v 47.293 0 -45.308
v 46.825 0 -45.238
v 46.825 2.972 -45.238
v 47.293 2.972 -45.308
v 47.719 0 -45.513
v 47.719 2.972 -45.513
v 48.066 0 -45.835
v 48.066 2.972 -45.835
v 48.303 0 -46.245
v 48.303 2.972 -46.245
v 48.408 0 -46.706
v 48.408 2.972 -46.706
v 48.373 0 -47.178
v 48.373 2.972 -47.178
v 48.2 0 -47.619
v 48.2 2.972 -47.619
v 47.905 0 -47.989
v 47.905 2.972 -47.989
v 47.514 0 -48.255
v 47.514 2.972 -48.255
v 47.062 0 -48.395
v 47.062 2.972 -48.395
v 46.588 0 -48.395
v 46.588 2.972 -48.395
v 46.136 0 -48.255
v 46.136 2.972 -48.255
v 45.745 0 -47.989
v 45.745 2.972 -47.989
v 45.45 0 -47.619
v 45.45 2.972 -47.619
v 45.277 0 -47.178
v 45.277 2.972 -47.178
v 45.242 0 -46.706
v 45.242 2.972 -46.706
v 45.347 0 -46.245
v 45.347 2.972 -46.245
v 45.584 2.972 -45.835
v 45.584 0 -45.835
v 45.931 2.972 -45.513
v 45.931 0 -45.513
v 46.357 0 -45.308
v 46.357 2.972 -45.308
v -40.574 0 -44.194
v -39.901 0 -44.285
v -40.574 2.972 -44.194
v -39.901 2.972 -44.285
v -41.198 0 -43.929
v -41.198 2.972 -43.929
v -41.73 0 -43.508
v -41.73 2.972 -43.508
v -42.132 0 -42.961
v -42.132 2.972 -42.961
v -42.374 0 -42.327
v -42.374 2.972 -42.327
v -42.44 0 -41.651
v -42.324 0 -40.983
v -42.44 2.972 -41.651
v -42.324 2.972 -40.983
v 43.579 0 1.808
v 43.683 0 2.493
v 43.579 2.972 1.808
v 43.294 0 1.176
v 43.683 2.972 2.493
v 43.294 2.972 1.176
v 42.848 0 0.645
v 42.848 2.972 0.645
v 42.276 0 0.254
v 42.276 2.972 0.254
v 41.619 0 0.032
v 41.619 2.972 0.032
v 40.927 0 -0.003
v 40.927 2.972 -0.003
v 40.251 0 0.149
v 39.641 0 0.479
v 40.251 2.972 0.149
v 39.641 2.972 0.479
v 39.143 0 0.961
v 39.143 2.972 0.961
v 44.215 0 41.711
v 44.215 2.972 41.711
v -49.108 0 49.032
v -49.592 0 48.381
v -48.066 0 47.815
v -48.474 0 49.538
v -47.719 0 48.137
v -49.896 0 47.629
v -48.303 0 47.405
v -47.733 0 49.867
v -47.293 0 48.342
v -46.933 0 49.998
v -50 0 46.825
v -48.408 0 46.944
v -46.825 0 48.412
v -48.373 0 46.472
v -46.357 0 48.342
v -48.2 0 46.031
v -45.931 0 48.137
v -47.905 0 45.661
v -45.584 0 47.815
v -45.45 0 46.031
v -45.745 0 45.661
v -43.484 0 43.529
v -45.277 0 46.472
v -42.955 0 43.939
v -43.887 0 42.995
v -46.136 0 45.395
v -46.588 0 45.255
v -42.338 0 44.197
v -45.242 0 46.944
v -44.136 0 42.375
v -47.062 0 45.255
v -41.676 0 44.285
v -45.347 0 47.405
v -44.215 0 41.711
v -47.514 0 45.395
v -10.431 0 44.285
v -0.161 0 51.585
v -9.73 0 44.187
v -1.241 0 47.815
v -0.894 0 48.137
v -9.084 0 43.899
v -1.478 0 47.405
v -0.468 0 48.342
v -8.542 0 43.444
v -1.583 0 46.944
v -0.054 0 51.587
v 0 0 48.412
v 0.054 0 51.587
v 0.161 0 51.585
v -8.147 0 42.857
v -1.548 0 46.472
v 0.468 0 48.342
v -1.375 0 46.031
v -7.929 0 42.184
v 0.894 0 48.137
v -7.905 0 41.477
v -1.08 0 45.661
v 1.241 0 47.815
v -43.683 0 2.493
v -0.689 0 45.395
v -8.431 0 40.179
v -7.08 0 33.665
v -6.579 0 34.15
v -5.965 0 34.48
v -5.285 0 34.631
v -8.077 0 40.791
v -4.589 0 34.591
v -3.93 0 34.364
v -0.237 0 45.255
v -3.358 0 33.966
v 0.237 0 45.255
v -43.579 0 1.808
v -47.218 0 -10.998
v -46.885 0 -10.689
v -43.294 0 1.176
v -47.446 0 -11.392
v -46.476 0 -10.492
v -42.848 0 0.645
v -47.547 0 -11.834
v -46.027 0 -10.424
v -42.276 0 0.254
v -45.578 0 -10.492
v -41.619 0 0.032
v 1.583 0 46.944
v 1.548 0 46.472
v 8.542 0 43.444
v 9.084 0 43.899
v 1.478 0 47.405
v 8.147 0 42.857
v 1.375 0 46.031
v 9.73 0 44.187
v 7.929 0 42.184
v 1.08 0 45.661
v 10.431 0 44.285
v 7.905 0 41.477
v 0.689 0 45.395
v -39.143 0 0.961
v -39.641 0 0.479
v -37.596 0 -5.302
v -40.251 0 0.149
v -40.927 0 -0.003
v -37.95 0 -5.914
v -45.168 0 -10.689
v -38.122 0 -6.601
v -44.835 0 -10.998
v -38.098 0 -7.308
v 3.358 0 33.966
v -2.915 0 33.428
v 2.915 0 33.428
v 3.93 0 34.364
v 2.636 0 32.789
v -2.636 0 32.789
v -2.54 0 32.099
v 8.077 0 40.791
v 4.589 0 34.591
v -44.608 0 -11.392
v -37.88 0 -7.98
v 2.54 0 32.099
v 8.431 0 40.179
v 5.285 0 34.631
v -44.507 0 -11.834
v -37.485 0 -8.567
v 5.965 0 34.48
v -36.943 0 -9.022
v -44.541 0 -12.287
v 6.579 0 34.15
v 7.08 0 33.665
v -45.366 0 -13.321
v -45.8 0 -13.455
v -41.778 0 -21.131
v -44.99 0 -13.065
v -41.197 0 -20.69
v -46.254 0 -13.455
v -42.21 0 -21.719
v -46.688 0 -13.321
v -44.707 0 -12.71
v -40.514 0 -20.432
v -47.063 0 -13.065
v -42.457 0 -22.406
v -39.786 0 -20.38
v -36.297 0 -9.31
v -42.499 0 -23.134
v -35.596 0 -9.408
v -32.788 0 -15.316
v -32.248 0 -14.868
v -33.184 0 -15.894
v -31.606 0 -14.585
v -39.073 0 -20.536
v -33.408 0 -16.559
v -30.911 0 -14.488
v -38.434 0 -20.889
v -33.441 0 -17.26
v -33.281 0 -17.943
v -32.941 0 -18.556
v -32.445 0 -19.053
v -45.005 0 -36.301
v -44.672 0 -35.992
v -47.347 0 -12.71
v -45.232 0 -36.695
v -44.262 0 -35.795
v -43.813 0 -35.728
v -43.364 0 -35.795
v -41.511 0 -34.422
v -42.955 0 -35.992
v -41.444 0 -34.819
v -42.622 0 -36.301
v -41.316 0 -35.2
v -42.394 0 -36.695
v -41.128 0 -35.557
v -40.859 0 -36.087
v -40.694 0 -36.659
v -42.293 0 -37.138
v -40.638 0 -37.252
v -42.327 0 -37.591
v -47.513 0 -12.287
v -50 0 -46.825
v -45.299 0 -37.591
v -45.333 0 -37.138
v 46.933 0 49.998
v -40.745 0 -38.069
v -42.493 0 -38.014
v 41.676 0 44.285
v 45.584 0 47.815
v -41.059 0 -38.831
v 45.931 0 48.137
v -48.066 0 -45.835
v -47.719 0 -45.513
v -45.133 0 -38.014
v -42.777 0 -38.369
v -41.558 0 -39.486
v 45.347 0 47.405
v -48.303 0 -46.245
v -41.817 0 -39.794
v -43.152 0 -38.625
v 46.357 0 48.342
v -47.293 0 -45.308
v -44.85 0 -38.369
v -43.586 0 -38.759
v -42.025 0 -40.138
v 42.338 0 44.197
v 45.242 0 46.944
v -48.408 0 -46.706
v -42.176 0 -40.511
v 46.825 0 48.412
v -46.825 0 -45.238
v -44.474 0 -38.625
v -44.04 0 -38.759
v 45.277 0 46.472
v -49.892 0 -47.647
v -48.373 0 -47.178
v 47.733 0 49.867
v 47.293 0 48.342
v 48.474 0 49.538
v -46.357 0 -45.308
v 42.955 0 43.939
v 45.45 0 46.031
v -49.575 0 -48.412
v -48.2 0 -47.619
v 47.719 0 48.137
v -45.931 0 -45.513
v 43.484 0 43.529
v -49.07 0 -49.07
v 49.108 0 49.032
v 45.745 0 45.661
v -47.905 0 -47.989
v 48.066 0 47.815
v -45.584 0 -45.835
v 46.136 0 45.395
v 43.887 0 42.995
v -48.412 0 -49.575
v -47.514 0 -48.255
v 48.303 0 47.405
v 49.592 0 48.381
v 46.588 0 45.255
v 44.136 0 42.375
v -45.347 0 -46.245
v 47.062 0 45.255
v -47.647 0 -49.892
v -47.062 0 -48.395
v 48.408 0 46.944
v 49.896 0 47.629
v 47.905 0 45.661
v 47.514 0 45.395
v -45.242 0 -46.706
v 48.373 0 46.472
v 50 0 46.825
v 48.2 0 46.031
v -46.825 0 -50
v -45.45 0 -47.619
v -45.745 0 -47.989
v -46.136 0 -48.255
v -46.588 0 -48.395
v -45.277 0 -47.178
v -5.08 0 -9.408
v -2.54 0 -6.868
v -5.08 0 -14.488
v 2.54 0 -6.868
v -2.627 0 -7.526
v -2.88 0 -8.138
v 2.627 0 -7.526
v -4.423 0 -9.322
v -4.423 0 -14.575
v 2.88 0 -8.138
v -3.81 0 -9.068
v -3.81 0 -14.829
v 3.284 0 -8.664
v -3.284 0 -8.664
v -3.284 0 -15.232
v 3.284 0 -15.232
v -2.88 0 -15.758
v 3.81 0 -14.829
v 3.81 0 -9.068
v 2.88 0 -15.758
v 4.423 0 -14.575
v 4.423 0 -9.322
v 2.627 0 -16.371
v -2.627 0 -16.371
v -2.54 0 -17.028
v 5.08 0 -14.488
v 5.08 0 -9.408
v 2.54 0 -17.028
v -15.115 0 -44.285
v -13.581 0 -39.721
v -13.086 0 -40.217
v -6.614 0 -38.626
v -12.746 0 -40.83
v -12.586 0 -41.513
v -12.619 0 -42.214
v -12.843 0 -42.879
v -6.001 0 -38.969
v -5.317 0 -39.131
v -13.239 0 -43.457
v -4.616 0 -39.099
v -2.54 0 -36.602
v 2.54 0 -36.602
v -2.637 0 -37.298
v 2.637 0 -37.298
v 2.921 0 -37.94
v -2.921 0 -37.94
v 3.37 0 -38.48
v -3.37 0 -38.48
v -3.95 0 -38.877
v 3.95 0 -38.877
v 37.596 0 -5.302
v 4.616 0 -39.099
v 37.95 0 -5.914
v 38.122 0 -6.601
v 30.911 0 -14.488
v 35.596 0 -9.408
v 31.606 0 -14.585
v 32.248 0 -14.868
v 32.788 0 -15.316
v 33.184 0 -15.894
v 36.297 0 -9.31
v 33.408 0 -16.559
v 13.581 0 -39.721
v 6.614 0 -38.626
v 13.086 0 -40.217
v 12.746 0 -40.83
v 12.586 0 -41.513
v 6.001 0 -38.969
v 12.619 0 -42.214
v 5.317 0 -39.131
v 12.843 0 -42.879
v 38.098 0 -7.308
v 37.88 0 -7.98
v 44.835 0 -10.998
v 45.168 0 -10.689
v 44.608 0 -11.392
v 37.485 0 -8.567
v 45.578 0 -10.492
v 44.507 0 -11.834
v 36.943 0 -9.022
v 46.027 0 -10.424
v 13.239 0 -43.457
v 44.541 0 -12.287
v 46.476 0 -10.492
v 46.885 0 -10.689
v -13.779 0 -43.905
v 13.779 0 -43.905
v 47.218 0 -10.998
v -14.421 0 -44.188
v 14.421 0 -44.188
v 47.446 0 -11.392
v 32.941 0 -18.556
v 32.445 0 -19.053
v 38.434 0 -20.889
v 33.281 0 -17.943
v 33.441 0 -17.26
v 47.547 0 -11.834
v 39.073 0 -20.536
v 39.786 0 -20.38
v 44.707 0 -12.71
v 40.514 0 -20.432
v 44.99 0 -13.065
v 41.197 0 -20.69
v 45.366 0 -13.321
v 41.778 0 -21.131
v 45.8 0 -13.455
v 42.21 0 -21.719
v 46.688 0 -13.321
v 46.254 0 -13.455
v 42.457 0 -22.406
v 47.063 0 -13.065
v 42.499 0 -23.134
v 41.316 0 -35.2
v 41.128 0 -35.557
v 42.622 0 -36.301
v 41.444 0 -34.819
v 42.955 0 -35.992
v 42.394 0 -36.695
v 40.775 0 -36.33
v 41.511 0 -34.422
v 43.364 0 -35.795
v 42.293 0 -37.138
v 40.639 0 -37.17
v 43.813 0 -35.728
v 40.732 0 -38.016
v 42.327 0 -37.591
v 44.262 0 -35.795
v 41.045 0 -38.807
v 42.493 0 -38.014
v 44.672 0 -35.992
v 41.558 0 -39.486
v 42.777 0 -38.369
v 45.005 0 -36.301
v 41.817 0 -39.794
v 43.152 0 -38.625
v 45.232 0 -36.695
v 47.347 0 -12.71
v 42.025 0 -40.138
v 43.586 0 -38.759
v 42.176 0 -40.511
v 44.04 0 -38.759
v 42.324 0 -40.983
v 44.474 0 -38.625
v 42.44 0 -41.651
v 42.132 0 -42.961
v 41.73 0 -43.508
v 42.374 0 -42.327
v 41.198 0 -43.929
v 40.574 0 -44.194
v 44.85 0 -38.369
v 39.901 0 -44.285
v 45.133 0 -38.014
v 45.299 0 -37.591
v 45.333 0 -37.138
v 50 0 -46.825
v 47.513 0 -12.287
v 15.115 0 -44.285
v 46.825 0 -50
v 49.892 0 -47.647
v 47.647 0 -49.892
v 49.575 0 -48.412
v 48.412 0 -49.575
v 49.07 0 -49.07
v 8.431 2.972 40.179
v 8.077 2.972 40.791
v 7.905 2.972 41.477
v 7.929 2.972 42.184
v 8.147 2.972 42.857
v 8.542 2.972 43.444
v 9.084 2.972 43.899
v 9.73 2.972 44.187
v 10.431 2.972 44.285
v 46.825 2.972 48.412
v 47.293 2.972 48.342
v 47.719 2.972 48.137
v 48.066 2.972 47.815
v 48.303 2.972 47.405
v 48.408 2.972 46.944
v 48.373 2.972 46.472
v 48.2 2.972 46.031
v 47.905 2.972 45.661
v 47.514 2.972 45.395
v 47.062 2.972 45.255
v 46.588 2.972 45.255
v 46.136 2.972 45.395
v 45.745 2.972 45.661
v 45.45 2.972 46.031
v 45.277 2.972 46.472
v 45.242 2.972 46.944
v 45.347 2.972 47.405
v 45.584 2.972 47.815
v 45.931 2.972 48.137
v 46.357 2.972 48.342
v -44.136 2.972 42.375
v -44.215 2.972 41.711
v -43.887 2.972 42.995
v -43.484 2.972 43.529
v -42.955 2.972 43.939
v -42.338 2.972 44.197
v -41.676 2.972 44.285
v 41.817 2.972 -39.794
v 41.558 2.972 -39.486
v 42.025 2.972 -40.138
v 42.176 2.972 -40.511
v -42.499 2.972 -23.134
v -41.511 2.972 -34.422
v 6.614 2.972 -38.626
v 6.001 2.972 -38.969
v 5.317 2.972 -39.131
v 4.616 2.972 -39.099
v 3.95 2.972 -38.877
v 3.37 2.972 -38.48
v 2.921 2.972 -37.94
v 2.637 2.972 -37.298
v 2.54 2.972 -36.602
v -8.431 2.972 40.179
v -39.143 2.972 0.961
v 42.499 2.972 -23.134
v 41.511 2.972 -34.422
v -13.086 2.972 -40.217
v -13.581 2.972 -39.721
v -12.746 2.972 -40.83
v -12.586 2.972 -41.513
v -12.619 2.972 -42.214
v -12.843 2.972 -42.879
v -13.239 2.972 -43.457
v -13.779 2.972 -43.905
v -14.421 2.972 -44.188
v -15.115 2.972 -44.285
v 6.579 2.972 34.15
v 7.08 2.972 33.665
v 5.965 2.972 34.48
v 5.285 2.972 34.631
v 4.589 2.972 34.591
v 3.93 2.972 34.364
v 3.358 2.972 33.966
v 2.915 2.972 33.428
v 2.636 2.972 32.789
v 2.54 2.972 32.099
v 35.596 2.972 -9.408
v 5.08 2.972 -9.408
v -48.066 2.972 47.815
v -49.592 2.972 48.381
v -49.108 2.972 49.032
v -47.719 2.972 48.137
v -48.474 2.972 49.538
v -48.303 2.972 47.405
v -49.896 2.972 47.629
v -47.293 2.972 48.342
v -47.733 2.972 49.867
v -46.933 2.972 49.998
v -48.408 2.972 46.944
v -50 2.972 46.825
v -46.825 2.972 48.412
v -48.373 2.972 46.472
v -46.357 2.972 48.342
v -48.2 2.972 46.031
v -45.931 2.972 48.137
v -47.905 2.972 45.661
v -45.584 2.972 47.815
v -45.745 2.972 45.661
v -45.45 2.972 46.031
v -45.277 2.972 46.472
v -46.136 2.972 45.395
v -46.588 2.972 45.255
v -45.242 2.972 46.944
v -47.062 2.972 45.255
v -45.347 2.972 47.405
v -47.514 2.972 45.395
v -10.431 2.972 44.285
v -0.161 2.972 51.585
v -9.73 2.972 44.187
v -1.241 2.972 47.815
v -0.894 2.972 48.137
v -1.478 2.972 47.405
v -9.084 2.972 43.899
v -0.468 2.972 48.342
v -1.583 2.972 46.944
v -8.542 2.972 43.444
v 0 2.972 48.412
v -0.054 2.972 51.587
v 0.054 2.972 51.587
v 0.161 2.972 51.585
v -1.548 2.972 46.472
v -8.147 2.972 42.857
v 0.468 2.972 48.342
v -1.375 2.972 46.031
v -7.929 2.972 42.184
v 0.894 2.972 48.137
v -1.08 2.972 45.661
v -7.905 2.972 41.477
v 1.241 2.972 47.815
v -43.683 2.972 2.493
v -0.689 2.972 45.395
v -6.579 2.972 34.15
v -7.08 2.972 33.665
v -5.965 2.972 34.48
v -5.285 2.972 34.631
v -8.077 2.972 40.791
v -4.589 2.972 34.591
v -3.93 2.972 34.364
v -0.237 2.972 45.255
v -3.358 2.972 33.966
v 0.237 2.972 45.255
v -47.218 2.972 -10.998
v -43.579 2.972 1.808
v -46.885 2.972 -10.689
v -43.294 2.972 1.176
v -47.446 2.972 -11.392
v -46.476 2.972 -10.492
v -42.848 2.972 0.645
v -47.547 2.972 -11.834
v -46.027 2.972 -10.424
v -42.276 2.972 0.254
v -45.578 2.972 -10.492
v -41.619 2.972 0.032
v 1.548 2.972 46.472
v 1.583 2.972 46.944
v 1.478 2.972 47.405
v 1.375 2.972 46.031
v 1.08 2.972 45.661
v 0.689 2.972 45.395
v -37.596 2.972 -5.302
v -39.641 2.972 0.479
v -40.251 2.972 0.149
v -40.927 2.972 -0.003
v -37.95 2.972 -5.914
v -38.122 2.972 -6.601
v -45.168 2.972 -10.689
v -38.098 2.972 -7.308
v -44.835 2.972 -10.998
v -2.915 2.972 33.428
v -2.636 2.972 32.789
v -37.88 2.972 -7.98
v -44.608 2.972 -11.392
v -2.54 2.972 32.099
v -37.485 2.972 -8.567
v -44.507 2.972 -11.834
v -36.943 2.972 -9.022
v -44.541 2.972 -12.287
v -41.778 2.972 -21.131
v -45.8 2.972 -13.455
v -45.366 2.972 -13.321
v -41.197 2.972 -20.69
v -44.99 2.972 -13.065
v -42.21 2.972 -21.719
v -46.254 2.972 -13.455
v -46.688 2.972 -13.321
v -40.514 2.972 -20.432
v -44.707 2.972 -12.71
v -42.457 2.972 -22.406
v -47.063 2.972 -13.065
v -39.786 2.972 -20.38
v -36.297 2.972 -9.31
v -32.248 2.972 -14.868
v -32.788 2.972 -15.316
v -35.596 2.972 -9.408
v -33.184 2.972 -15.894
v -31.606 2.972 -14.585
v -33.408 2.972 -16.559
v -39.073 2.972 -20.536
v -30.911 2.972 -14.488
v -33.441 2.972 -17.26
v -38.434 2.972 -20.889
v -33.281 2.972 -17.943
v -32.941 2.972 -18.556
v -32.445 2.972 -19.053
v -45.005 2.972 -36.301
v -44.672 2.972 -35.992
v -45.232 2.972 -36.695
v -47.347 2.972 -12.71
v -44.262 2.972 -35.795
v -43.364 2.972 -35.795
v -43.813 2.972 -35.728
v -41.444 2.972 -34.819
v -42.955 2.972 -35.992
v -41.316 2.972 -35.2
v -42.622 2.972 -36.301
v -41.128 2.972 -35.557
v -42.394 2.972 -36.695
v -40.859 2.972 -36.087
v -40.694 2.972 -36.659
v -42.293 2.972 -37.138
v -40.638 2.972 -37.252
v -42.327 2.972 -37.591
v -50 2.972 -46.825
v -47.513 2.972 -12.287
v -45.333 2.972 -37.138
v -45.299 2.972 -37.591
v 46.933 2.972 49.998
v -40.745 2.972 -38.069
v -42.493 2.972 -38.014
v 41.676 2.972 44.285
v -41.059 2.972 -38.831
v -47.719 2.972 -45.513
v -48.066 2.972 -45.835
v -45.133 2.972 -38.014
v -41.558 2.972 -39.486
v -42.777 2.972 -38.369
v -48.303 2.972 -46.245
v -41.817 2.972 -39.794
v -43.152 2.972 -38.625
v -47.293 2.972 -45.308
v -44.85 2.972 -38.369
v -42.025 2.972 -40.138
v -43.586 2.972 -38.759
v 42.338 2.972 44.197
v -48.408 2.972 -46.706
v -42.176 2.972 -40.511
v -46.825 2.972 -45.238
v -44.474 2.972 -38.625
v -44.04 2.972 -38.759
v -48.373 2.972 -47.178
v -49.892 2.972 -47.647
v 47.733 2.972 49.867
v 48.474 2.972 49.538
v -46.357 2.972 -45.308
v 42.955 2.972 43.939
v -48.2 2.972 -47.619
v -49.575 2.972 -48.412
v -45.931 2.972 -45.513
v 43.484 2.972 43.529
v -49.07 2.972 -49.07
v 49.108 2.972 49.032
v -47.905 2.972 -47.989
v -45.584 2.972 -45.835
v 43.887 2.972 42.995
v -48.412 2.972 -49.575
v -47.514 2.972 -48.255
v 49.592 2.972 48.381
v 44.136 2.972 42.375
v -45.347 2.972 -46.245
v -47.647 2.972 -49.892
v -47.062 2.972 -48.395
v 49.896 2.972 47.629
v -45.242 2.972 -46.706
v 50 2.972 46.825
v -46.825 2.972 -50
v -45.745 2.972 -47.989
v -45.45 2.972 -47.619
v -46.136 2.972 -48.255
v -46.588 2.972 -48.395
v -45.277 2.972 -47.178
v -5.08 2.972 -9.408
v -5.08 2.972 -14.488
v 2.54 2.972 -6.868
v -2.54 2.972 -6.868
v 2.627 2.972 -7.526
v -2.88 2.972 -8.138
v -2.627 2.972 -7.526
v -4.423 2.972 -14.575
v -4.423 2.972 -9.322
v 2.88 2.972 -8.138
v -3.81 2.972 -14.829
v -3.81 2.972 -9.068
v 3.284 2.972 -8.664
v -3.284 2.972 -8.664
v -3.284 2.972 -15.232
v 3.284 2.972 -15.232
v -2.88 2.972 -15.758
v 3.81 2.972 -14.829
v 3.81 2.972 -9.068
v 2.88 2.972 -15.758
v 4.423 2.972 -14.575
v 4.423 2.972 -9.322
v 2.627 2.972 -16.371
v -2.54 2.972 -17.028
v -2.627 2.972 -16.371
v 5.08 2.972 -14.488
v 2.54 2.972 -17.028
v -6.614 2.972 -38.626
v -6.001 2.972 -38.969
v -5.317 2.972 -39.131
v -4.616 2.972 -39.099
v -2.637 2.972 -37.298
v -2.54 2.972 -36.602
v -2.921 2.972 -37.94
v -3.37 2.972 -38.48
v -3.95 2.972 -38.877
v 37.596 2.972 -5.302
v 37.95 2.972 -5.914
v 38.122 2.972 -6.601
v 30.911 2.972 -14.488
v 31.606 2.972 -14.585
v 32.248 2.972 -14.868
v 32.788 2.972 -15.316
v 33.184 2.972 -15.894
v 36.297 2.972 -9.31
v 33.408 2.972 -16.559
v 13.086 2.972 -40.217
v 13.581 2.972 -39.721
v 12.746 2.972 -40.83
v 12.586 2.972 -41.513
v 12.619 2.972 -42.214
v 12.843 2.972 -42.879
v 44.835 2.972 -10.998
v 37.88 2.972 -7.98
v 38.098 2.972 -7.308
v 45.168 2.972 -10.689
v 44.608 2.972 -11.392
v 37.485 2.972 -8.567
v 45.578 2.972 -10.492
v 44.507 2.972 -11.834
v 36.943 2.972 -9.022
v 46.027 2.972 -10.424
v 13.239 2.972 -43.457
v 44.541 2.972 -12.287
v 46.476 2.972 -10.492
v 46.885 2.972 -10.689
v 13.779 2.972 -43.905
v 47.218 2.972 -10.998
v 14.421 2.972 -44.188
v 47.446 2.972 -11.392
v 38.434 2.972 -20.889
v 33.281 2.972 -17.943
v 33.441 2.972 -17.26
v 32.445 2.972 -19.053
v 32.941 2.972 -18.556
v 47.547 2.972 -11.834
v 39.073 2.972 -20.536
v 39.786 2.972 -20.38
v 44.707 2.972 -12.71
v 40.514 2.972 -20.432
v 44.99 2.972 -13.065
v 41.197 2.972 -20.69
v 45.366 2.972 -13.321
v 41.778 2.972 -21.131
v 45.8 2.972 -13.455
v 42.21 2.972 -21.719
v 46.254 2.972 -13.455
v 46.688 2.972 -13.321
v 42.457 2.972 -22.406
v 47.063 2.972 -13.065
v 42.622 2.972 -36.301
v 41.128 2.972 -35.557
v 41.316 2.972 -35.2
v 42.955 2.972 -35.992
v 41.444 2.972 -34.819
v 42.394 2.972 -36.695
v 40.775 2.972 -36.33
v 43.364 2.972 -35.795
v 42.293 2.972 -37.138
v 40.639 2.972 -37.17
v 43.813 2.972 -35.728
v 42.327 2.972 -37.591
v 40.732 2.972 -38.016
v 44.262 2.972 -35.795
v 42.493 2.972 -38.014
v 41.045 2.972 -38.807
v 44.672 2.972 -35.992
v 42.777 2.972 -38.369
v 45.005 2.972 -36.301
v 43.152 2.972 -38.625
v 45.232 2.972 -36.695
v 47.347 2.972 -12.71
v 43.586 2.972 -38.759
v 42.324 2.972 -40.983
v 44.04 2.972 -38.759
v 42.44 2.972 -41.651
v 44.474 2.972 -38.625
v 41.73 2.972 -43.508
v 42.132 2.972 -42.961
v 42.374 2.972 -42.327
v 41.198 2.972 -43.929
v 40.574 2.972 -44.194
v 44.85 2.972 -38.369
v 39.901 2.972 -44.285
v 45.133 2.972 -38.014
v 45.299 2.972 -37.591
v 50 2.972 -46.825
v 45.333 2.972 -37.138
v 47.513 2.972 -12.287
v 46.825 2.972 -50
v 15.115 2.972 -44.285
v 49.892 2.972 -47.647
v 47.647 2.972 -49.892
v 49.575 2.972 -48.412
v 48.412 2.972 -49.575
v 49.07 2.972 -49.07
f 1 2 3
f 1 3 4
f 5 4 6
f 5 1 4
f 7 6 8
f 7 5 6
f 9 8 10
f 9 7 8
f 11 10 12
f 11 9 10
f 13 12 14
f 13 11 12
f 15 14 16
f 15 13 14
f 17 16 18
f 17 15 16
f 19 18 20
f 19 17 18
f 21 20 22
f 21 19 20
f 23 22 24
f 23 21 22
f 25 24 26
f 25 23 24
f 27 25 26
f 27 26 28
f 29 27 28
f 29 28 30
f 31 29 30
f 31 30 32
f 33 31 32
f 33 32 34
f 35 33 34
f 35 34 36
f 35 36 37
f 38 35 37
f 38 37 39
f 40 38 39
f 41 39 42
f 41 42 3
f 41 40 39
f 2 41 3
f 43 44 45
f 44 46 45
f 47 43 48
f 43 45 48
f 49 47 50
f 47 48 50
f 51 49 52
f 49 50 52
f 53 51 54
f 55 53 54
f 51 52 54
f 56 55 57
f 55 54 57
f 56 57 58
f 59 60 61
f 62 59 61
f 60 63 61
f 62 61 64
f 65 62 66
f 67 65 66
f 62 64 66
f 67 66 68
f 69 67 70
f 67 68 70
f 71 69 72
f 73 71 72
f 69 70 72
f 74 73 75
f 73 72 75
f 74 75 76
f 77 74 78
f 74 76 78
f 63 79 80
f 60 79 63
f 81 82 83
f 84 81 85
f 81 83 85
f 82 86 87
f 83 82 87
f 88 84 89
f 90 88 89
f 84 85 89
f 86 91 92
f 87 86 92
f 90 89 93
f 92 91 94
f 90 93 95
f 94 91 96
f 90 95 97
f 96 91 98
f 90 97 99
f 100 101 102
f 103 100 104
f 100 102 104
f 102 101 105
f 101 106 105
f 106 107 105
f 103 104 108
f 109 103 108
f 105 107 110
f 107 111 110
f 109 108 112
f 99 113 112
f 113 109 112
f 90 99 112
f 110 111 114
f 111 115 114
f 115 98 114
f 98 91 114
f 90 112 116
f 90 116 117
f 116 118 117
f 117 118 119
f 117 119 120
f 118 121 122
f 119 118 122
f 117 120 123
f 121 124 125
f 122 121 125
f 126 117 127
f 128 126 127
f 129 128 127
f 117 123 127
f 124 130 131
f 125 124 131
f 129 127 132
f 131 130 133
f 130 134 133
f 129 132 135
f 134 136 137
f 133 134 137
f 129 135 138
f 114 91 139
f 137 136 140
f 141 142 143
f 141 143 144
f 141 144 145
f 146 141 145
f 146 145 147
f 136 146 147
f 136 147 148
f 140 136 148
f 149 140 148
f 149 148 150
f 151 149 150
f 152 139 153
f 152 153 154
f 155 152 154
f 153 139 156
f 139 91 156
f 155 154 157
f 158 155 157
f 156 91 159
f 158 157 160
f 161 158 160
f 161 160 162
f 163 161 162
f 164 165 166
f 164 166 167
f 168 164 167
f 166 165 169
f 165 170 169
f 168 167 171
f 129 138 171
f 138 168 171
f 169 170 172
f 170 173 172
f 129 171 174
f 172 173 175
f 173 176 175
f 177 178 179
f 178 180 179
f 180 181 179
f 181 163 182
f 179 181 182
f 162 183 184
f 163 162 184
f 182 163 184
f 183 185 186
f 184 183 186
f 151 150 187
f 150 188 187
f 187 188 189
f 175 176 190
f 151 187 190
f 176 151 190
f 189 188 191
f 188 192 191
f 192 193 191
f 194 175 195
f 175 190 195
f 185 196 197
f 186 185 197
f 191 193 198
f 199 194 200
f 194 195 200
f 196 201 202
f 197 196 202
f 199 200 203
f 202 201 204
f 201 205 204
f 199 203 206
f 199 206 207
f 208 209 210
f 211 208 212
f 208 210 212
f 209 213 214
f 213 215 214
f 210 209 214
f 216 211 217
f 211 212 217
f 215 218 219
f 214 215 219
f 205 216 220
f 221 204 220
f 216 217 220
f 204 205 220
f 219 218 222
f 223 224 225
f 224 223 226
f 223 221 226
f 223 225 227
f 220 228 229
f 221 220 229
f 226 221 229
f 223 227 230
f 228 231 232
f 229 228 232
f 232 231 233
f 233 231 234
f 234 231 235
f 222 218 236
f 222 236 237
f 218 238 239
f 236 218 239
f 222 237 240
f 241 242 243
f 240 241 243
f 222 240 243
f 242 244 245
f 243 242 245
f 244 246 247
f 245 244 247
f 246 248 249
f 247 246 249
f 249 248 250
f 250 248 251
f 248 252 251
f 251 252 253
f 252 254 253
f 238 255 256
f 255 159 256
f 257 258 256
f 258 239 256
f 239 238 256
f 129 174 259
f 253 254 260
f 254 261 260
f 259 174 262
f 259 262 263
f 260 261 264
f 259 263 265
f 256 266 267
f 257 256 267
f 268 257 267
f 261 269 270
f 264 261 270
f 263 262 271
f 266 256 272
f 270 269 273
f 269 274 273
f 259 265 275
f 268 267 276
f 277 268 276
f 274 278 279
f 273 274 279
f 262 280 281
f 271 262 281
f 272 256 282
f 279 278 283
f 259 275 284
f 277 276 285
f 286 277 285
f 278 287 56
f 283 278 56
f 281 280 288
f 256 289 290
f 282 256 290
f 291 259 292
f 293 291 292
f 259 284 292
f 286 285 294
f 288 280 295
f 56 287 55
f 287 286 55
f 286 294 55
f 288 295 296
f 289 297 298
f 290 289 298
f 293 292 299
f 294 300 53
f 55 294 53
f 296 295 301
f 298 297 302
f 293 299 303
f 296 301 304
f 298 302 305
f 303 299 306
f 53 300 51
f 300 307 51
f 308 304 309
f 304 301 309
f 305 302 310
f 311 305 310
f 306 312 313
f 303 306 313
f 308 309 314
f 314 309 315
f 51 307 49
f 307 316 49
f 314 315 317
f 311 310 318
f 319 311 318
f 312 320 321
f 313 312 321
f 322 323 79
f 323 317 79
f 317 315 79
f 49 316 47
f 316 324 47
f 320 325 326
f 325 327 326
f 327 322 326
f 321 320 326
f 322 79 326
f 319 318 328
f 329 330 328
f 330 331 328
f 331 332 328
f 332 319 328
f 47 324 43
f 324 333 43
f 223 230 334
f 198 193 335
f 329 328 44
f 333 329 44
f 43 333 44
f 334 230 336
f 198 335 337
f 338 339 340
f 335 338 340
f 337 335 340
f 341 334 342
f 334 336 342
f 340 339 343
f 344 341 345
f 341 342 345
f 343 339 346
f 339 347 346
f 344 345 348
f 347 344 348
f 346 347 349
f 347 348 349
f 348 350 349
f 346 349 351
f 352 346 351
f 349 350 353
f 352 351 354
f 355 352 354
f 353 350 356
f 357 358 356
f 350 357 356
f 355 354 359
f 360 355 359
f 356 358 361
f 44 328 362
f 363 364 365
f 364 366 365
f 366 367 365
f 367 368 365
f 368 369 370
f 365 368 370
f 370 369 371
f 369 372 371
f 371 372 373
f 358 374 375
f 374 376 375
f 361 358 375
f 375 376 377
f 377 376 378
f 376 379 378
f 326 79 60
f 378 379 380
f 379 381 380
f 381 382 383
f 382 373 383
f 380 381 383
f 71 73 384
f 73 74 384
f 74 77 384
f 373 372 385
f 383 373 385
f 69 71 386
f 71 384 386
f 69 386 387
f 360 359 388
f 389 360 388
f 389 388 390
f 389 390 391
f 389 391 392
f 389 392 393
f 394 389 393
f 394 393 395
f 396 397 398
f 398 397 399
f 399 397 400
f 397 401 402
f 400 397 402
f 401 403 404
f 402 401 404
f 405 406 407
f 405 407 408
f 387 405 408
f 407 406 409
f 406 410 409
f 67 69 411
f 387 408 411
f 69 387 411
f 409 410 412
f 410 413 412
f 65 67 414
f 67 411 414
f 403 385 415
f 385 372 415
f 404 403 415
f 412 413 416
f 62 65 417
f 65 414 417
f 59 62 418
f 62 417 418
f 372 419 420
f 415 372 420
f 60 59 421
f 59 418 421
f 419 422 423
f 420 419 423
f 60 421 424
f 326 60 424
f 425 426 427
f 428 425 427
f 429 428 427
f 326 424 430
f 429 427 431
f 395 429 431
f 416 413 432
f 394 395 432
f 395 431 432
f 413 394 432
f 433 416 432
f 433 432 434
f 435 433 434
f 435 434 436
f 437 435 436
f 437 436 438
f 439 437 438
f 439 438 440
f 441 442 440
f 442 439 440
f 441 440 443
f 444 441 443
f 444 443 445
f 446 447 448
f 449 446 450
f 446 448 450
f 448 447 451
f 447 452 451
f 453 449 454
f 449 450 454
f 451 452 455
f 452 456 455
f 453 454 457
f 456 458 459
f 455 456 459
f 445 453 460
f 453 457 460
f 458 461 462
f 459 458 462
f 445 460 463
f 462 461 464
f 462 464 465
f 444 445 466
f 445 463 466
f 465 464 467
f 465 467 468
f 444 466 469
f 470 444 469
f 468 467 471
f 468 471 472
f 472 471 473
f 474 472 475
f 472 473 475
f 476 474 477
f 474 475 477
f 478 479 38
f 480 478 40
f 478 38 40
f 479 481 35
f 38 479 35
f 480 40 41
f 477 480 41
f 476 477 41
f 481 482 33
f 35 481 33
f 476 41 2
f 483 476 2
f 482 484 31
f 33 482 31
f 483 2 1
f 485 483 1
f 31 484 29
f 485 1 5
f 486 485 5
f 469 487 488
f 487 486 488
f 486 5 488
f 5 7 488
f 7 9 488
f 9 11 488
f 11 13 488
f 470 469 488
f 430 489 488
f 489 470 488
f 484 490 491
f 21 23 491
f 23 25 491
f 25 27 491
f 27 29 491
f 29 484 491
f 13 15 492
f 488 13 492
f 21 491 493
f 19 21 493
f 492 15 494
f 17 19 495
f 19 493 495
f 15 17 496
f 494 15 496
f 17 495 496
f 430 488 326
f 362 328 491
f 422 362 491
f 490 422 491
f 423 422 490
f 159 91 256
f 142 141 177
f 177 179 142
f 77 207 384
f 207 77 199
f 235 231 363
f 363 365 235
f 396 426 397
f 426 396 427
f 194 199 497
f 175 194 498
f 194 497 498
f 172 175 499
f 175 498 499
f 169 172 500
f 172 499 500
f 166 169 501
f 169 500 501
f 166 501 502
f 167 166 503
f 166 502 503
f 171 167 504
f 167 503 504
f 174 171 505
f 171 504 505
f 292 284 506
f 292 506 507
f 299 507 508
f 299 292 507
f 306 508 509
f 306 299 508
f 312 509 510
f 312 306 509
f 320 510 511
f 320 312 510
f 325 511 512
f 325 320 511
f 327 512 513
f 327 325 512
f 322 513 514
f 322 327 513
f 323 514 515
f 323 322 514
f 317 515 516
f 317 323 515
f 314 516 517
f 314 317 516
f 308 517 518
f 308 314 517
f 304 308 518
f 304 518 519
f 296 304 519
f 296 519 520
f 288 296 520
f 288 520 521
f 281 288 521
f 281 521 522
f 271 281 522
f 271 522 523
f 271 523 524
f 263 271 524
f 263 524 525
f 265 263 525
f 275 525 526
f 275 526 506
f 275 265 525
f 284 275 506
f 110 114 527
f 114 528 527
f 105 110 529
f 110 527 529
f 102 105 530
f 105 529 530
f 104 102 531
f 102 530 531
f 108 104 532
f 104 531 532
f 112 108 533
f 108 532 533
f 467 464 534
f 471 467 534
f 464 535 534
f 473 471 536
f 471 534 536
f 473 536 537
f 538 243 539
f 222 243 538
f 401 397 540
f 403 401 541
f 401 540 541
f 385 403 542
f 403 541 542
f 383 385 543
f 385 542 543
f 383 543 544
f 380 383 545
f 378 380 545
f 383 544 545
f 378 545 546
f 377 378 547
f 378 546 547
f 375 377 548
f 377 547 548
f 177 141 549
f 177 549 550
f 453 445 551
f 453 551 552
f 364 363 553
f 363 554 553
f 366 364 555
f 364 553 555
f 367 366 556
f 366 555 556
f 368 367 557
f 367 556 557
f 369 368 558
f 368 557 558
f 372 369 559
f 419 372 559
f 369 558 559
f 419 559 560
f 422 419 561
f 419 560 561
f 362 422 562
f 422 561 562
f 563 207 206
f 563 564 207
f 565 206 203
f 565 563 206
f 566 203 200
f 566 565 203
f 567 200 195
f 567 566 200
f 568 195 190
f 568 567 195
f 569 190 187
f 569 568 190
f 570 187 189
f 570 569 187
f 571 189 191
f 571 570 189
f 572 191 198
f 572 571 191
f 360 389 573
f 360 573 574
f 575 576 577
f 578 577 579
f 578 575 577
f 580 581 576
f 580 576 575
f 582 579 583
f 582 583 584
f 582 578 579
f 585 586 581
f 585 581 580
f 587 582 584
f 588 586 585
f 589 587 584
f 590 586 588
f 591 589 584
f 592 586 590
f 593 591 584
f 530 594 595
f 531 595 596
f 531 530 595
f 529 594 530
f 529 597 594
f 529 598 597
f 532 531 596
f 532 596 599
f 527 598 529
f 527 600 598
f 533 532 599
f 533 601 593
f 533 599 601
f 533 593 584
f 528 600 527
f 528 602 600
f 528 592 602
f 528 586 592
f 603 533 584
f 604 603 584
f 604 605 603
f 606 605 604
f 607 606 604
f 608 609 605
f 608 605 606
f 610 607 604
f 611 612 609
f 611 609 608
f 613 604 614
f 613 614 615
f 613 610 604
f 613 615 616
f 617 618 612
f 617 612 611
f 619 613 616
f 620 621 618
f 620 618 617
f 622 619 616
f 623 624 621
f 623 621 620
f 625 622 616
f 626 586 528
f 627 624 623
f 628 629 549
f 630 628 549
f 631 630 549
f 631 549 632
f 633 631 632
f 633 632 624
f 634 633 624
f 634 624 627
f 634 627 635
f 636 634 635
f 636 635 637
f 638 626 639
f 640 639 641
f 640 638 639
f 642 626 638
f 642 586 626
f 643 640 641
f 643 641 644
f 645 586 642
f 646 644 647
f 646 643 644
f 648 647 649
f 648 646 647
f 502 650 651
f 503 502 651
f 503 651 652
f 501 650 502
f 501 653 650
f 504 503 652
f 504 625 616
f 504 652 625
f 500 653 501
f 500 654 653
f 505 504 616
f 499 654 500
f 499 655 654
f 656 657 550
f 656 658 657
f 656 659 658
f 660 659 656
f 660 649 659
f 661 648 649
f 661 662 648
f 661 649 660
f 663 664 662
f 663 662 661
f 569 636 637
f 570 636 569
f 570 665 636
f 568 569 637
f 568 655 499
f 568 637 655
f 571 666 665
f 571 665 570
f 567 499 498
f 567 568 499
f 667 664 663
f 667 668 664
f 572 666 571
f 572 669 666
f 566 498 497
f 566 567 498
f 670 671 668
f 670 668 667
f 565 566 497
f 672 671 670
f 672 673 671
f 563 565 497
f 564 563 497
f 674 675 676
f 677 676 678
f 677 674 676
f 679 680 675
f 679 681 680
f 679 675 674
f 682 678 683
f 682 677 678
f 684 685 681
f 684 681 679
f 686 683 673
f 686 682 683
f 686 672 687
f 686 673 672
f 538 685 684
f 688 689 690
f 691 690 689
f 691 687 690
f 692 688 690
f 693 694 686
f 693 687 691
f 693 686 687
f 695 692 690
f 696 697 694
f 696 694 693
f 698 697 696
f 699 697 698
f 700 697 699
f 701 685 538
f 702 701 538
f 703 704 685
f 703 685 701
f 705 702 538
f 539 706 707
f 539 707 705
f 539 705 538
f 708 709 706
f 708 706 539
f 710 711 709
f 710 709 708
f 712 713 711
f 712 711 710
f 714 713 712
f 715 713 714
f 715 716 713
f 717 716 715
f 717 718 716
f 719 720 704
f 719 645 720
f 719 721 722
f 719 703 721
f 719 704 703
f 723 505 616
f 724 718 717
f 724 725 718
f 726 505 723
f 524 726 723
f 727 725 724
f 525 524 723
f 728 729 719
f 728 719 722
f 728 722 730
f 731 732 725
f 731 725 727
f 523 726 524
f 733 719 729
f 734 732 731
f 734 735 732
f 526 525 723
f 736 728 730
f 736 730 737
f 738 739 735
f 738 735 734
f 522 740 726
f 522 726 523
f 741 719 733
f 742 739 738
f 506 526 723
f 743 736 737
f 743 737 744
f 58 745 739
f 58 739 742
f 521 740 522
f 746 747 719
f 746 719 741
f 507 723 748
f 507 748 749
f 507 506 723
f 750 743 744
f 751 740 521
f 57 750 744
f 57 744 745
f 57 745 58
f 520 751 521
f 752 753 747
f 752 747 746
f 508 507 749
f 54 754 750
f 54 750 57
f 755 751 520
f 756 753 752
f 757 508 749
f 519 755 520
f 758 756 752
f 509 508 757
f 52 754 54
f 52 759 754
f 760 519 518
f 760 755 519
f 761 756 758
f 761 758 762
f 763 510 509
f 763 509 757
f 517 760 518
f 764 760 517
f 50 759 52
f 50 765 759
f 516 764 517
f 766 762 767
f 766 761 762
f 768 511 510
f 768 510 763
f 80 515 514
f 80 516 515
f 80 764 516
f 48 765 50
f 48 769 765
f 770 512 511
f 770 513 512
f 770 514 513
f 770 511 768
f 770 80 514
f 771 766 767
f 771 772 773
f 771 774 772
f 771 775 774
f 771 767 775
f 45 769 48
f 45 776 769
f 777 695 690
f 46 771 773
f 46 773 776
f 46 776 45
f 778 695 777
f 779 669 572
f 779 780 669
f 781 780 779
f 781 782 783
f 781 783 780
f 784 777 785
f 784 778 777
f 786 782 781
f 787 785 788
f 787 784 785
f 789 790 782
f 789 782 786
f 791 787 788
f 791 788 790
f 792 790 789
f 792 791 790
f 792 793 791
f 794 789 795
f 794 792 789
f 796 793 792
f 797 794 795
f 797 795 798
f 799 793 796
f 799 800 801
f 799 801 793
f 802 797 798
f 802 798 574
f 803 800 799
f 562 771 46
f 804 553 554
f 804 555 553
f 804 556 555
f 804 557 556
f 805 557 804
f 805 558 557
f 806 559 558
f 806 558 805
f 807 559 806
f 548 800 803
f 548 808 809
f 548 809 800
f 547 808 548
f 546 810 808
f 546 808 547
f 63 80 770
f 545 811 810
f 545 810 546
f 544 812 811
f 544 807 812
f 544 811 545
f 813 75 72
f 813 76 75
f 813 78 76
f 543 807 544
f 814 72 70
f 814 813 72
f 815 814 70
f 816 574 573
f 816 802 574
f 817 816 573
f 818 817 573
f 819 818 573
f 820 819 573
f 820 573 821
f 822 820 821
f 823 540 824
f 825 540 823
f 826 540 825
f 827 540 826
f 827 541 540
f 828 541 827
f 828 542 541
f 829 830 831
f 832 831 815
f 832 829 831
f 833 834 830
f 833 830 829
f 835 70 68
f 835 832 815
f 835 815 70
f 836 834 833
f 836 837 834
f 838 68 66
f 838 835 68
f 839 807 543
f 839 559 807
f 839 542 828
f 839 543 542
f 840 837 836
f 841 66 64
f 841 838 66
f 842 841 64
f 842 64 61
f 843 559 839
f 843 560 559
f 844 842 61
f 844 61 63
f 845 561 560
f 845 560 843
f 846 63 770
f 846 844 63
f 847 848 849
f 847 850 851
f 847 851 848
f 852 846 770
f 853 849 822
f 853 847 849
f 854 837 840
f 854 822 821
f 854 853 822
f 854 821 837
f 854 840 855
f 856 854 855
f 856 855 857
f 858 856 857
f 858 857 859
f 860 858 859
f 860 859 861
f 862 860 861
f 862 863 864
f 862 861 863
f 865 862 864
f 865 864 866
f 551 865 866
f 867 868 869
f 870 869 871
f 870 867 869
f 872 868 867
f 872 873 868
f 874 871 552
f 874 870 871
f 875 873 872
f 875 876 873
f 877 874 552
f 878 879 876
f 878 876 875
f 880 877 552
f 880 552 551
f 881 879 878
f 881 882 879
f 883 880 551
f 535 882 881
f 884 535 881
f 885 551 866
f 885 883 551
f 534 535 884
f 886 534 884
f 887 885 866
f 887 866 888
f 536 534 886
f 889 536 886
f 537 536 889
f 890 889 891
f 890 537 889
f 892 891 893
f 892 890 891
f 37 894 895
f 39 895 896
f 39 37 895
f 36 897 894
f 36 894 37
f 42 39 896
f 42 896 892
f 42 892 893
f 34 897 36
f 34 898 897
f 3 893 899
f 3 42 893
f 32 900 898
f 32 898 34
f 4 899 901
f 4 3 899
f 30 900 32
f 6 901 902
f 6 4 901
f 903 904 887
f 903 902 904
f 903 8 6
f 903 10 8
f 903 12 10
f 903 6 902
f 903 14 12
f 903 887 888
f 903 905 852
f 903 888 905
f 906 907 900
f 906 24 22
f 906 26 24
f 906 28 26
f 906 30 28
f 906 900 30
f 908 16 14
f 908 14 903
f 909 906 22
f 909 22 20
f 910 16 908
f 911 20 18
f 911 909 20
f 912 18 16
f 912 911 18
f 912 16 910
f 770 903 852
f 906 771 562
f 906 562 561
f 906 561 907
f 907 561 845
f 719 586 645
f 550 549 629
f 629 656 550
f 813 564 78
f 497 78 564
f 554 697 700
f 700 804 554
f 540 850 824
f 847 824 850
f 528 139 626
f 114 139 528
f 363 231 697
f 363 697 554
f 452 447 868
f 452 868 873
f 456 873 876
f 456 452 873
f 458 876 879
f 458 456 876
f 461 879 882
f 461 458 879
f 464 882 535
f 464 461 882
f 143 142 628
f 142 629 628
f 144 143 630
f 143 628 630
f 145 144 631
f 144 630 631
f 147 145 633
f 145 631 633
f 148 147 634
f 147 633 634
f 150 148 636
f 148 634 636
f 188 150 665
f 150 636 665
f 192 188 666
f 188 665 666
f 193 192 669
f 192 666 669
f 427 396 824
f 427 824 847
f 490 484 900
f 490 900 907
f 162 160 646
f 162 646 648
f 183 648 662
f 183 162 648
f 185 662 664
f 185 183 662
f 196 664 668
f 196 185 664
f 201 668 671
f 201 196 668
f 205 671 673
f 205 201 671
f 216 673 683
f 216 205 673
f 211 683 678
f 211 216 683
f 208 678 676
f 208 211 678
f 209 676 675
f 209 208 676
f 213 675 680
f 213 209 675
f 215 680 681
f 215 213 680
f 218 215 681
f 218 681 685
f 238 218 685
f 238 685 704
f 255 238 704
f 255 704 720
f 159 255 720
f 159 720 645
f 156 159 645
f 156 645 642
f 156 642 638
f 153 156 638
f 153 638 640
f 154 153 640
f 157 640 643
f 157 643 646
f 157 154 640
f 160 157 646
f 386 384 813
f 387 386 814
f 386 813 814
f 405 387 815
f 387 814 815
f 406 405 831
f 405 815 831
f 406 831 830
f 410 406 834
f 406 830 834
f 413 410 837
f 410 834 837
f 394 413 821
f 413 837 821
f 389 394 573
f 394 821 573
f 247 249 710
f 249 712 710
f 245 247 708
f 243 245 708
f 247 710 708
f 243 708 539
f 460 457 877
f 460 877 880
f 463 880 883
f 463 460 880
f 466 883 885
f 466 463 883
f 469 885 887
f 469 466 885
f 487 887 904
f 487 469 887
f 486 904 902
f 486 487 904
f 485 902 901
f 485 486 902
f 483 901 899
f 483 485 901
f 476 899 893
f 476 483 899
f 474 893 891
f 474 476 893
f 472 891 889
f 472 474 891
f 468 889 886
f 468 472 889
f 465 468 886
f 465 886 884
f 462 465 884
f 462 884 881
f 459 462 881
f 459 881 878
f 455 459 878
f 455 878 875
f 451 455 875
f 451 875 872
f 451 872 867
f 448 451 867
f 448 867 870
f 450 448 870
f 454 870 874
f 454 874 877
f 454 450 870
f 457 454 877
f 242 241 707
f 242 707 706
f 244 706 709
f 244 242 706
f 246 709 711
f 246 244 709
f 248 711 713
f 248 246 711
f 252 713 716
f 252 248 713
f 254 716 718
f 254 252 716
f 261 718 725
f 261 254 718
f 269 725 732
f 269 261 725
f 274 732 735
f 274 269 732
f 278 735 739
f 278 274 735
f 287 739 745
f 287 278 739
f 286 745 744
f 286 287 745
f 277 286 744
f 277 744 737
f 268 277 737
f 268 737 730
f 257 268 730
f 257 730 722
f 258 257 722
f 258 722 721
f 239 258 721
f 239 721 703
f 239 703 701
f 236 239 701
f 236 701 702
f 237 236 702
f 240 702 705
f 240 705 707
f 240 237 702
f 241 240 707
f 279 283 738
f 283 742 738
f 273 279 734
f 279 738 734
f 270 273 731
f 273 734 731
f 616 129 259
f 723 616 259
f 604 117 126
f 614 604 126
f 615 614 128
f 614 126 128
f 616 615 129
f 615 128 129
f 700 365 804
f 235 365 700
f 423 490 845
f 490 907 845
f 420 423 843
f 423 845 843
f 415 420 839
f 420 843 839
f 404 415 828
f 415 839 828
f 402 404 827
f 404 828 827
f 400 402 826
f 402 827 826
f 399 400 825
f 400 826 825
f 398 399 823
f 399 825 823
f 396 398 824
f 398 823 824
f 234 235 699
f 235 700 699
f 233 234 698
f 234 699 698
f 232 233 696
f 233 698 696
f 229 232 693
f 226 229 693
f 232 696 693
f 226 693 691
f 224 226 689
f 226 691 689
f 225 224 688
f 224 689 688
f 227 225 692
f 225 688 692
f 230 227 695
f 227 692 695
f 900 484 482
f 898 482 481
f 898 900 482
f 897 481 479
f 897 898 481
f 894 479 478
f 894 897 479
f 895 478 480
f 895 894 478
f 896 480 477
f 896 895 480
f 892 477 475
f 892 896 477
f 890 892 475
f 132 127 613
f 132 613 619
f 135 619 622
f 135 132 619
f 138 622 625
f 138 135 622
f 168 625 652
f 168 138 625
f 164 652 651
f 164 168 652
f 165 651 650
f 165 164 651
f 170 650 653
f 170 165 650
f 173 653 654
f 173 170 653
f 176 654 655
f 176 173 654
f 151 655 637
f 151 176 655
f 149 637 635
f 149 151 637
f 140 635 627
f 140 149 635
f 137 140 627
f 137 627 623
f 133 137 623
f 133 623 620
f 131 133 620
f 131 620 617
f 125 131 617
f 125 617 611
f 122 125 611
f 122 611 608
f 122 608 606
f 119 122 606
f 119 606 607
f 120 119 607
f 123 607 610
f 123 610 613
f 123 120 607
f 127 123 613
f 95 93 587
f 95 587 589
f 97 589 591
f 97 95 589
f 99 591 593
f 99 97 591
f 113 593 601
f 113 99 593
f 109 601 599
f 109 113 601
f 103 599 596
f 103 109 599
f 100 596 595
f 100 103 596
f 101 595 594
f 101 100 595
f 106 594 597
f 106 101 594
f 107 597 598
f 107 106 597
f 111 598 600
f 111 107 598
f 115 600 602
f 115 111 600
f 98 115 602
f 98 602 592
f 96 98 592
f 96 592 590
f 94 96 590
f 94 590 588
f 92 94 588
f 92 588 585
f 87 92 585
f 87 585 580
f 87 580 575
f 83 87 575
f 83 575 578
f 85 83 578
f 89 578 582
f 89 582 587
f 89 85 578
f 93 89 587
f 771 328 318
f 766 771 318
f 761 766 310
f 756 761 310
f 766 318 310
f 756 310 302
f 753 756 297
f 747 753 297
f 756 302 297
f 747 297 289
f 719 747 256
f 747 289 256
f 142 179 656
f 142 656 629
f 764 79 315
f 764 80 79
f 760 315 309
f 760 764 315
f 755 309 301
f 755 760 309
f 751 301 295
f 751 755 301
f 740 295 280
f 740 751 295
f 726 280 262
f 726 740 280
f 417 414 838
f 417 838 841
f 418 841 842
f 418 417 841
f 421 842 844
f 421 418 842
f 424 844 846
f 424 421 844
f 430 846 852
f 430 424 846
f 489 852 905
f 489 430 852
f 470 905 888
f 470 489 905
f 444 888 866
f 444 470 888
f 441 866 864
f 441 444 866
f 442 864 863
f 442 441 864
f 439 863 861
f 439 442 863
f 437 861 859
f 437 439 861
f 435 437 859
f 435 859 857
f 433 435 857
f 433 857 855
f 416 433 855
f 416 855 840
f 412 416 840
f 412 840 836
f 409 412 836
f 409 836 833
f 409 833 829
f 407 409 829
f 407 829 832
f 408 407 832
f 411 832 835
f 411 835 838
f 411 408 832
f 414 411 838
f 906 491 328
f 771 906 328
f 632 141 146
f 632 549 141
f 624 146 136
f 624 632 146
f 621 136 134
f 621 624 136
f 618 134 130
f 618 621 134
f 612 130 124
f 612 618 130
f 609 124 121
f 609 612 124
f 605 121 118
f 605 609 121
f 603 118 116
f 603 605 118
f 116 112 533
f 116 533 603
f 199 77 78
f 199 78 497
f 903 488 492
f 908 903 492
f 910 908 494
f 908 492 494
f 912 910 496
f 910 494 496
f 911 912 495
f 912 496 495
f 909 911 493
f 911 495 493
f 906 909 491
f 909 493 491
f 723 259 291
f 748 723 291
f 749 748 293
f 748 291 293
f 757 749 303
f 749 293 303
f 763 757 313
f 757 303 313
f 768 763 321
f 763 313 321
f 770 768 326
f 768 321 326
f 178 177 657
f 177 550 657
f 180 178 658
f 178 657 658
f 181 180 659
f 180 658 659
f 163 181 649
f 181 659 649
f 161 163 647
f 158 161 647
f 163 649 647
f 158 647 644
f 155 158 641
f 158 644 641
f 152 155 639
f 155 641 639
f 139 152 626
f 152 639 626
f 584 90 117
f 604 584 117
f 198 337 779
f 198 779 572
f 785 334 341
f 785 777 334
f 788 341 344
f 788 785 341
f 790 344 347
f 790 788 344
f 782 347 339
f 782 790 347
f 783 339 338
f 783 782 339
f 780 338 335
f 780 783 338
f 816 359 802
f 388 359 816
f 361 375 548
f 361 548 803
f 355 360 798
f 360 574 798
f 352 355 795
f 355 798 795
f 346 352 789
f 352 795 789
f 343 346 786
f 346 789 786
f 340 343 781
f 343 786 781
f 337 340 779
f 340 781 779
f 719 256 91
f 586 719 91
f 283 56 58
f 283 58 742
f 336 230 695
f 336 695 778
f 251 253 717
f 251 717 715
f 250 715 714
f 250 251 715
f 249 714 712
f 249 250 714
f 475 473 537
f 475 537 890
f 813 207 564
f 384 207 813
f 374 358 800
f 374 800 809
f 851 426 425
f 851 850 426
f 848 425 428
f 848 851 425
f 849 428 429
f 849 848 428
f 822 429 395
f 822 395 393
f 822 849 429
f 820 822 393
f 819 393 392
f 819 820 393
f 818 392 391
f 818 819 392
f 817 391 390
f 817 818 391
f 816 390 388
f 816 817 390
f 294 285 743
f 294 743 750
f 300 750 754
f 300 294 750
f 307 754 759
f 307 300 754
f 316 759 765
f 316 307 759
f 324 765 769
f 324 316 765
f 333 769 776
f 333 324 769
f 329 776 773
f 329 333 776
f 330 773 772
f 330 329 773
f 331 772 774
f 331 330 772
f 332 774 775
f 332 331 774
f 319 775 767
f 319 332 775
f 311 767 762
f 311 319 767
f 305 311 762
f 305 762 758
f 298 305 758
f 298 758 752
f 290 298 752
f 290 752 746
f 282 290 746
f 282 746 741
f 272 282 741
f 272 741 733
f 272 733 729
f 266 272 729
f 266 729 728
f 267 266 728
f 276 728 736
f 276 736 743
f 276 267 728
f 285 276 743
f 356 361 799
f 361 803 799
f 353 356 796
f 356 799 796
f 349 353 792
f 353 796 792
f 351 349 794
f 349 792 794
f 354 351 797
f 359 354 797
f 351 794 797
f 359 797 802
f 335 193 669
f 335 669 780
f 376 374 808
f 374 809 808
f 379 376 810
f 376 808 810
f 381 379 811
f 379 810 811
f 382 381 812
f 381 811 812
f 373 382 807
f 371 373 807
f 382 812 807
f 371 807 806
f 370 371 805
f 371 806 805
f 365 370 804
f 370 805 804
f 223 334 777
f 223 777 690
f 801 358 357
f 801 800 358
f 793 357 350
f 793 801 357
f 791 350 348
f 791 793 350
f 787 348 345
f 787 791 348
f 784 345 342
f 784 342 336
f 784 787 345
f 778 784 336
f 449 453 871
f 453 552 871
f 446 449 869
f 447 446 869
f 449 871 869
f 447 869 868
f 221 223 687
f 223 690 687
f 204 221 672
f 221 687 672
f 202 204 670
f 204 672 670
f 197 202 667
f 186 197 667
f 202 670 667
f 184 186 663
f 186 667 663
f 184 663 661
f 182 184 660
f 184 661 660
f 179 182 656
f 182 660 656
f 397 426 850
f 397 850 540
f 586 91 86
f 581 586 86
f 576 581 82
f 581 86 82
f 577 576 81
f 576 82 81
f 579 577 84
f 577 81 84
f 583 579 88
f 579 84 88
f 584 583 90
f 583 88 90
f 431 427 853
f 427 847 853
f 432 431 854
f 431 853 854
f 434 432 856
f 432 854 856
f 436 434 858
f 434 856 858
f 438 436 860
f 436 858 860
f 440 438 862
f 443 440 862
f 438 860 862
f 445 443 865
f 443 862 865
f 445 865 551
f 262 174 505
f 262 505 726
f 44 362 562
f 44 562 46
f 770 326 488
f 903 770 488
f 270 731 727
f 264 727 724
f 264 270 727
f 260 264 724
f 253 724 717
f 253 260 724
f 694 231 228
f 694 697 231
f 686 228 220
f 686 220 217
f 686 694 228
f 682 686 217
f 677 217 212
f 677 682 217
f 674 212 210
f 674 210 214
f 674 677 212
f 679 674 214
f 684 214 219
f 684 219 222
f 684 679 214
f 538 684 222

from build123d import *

# Parameters (mm, degrees)
SKETCH2_R           = 3.175
SKETCH2_R_2         = 1.5875
SKETCH2_R_3         = 4.7625
SKETCH2_R_4         = 1.524
BOSS_EXTRUDE2_DEPTH = 2.9718
CUT_EXTRUDE1_DEPTH  = 72.903419609
FILLET1_R           = 2.54


with BuildPart() as part:
    # Sketch2 → Boss-Extrude2 (new body)
    # profile 1 of 10: a face of its own
    with BuildSketch(Plane(origin=(0, 0, 0), x_dir=(1, 0, 0), z_dir=(0, 1, 0))):
        with BuildLine():
            ThreePointArc((4.7625, -46.825), (3.424205755, -50.135018308), (0.161462226, -51.5847622))
            Line((0.161462226, -51.5847622), (46.932641484, -49.9981748))
            ThreePointArc((46.932641484, -49.9981748), (44.542196163, -44.618321128), (50, -46.825))
            Line((50, -46.825), (50, 46.825))
            ThreePointArc((50, 46.825), (44.57993597, 44.57993597), (46.825, 50))
            Line((46.825, 50), (-46.825, 50))
            ThreePointArc((-46.825, 50), (-44.57993597, 49.07006403), (-43.65, 46.825))
            ThreePointArc((-43.65, 46.825), (-46.825, 43.65), (-50, 46.825))
            Line((-50, 46.825), (-50, -46.825))
            ThreePointArc((-50, -46.825), (-46.825, -43.65), (-43.65, -46.825))
            ThreePointArc((-43.65, -46.825), (-44.618321128, -49.107803837), (-46.932641484, -49.9981748))
            Line((-46.932641484, -49.9981748), (-0.161462226, -51.5847622))
            ThreePointArc((-0.161462226, -51.5847622), (-3.310018308, -43.400794245), (4.7625, -46.825))
        make_face()
        with Locations((-46.026877933, 11.948327334)):
            Circle(SKETCH2_R, mode=Mode.SUBTRACT)
        with Locations((-43.813122067, 37.251672666)):
            Circle(SKETCH2_R, mode=Mode.SUBTRACT)
        with Locations((46.026877933, 11.948327334)):
            Circle(SKETCH2_R, mode=Mode.SUBTRACT)
        with Locations((43.813122067, 37.251672666)):
            Circle(SKETCH2_R, mode=Mode.SUBTRACT)
    # profile 2 of 10: a face of its own
    with BuildSketch(Plane(origin=(0, 0, 0), x_dir=(1, 0, 0), z_dir=(0, 1, 0))):
        with Locations((-46.825, -46.825)):
            Circle(SKETCH2_R)
        with Locations(Location((-46.825, -46.825, 0), (0, 0, 270))):
            Circle(SKETCH2_R_2, mode=Mode.SUBTRACT)
    # profile 3 of 10: a face of its own
    with BuildSketch(Plane(origin=(0, 0, 0), x_dir=(1, 0, 0), z_dir=(0, 1, 0))):
        with Locations((0, -46.825)):
            Circle(SKETCH2_R_3)
        with Locations(Location((0, -46.825, 0), (0, 0, 270))):
            Circle(SKETCH2_R_2, mode=Mode.SUBTRACT)
    # profile 4 of 10: a face of its own
    with BuildSketch(Plane(origin=(0, 0, 0), x_dir=(1, 0, 0), z_dir=(0, 1, 0))):
        with Locations((46.825, -46.825)):
            Circle(SKETCH2_R)
        with Locations(Location((46.825, -46.825, 0), (0, 0, 270))):
            Circle(SKETCH2_R_2, mode=Mode.SUBTRACT)
    # profile 5 of 10: a face of its own
    with BuildSketch(Plane(origin=(0, 0, 0), x_dir=(1, 0, 0), z_dir=(0, 1, 0))):
        with Locations((46.026877933, 11.948327334)):
            Circle(SKETCH2_R)
        with Locations(Location((46.026877933, 11.948327334, 0), (0, 0, 270))):
            Circle(SKETCH2_R_4, mode=Mode.SUBTRACT)
    # profile 6 of 10: a face of its own
    with BuildSketch(Plane(origin=(0, 0, 0), x_dir=(1, 0, 0), z_dir=(0, 1, 0))):
        with Locations((43.813122067, 37.251672666)):
            Circle(SKETCH2_R)
        with Locations(Location((43.813122067, 37.251672666, 0), (0, 0, 270))):
            Circle(SKETCH2_R_4, mode=Mode.SUBTRACT)
    # profile 7 of 10: a face of its own
    with BuildSketch(Plane(origin=(0, 0, 0), x_dir=(1, 0, 0), z_dir=(0, 1, 0))):
        with Locations((46.825, 46.825)):
            Circle(SKETCH2_R)
        with Locations(Location((46.825, 46.825, 0), (0, 0, 270))):
            Circle(SKETCH2_R_2, mode=Mode.SUBTRACT)
    # profile 8 of 10: a face of its own
    with BuildSketch(Plane(origin=(0, 0, 0), x_dir=(1, 0, 0), z_dir=(0, 1, 0))):
        with Locations((-43.813122067, 37.251672666)):
            Circle(SKETCH2_R)
        with Locations(Location((-43.813122067, 37.251672666, 0), (0, 0, 270))):
            Circle(SKETCH2_R_4, mode=Mode.SUBTRACT)
    # profile 9 of 10: a face of its own
    with BuildSketch(Plane(origin=(0, 0, 0), x_dir=(1, 0, 0), z_dir=(0, 1, 0))):
        with Locations((-46.825, 46.825)):
            Circle(SKETCH2_R)
        with Locations(Location((-46.825, 46.825, 0), (0, 0, 270))):
            Circle(SKETCH2_R_2, mode=Mode.SUBTRACT)
    # profile 10 of 10: a face of its own
    with BuildSketch(Plane(origin=(0, 0, 0), x_dir=(1, 0, 0), z_dir=(0, 1, 0))):
        with Locations((-46.026877933, 11.948327334)):
            Circle(SKETCH2_R)
        with Locations(Location((-46.026877933, 11.948327334, 0), (0, 0, 270))):
            Circle(SKETCH2_R_4, mode=Mode.SUBTRACT)
    extrude(amount=BOSS_EXTRUDE2_DEPTH)

    # Sketch3 → Cut-Extrude1 (cut, through all)
    with BuildSketch(Plane(origin=(0, 0, 0), x_dir=(1, 0, 0), z_dir=(0, 1, 0))):
        Polygon((-5.215323358, -44.285), (-43.584931126, 4.710491728), (-44.250273466, -44.285), align=None)
        Polygon((-2.54, 9.408327334), (-40.811554575, 9.408327334), (-2.54, -39.461956848), align=None)
        Polygon((2.54, -39.461956848), (40.811554575, 9.408327334), (2.54, 9.408327334), align=None)
        Polygon((44.250273466, -44.285), (43.584931126, 4.710491728), (5.215323358, -44.285), align=None)
        with BuildLine():
            Line((43.363147562, 44.285), (7.557737131, 44.285))
            Line((7.557737131, 44.285), (42.997535117, 17.43064252))
            Line((42.997535117, 17.43064252), (41.448819224, 35.132546179))
            ThreePointArc((41.448819224, 35.132546179), (40.65688527, 37.596338128), (41.961912119, 39.831139031))
            Line((41.961912119, 39.831139031), (43.363147562, 44.285))
        make_face()
        Polygon((38.469140802, 14.488327334), (2.54, 41.713482269), (2.54, 14.488327334), align=None)
        Polygon((-2.54, 14.488327334), (-2.54, 41.713482269), (-38.469140802, 14.488327334), align=None)
        with BuildLine():
            Line((-42.997535117, 17.43064252), (-7.557737131, 44.285))
            Line((-7.557737131, 44.285), (-43.363147562, 44.285))
            Line((-43.363147562, 44.285), (-41.961912119, 39.831139031))
            ThreePointArc((-41.961912119, 39.831139031), (-40.988390524, 38.70133356), (-40.638122067, 37.251672666))
            ThreePointArc((-40.638122067, 37.251672666), (-40.847714294, 36.117220491), (-41.448819224, 35.132546179))
            Line((-41.448819224, 35.132546179), (-42.997535117, 17.43064252))
        make_face()
    extrude(amount=CUT_EXTRUDE1_DEPTH, mode=Mode.SUBTRACT)

    # Fillet1
    fillet1_edges = [part.edges().sort_by_distance(p)[0] for p in [
        (41.448819224, 1.4859, -35.132546179),
        (41.961912119, 1.4859, -39.831139031),
        (43.363147562, 1.4859, -44.285),
        (7.557737131, 1.4859, -44.285),
        (42.997535117, 1.4859, -17.43064252),
        (5.215323358, 1.4859, 44.285),
        (44.250273466, 1.4859, 44.285),
        (43.584931126, 1.4859, -4.710491728),
        (40.811554575, 1.4859, -9.408327334),
        (2.54, 1.4859, -9.408327334),
        (2.54, 1.4859, 39.461956848),
        (-2.54, 1.4859, 39.461956848),
        (-2.54, 1.4859, -9.408327334),
        (-40.811554575, 1.4859, -9.408327334),
        (-41.961912119, 1.4859, -39.831139031),
        (-41.448819224, 1.4859, -35.132546179),
        (-42.997535117, 1.4859, -17.43064252),
        (-7.557737131, 1.4859, -44.285),
        (-43.363147562, 1.4859, -44.285),
        (-2.54, 1.4859, -41.713482269),
        (-38.469140802, 1.4859, -14.488327334),
        (-2.54, 1.4859, -14.488327334),
        (2.54, 1.4859, -41.713482269),
        (2.54, 1.4859, -14.488327334),
        (38.469140802, 1.4859, -14.488327334),
        (-43.584931126, 1.4859, -4.710491728),
        (-44.250273466, 1.4859, 44.285),
        (-5.215323358, 1.4859, 44.285),
    ]]
    fillet(fillet1_edges, radius=FILLET1_R)


solid = part.part
